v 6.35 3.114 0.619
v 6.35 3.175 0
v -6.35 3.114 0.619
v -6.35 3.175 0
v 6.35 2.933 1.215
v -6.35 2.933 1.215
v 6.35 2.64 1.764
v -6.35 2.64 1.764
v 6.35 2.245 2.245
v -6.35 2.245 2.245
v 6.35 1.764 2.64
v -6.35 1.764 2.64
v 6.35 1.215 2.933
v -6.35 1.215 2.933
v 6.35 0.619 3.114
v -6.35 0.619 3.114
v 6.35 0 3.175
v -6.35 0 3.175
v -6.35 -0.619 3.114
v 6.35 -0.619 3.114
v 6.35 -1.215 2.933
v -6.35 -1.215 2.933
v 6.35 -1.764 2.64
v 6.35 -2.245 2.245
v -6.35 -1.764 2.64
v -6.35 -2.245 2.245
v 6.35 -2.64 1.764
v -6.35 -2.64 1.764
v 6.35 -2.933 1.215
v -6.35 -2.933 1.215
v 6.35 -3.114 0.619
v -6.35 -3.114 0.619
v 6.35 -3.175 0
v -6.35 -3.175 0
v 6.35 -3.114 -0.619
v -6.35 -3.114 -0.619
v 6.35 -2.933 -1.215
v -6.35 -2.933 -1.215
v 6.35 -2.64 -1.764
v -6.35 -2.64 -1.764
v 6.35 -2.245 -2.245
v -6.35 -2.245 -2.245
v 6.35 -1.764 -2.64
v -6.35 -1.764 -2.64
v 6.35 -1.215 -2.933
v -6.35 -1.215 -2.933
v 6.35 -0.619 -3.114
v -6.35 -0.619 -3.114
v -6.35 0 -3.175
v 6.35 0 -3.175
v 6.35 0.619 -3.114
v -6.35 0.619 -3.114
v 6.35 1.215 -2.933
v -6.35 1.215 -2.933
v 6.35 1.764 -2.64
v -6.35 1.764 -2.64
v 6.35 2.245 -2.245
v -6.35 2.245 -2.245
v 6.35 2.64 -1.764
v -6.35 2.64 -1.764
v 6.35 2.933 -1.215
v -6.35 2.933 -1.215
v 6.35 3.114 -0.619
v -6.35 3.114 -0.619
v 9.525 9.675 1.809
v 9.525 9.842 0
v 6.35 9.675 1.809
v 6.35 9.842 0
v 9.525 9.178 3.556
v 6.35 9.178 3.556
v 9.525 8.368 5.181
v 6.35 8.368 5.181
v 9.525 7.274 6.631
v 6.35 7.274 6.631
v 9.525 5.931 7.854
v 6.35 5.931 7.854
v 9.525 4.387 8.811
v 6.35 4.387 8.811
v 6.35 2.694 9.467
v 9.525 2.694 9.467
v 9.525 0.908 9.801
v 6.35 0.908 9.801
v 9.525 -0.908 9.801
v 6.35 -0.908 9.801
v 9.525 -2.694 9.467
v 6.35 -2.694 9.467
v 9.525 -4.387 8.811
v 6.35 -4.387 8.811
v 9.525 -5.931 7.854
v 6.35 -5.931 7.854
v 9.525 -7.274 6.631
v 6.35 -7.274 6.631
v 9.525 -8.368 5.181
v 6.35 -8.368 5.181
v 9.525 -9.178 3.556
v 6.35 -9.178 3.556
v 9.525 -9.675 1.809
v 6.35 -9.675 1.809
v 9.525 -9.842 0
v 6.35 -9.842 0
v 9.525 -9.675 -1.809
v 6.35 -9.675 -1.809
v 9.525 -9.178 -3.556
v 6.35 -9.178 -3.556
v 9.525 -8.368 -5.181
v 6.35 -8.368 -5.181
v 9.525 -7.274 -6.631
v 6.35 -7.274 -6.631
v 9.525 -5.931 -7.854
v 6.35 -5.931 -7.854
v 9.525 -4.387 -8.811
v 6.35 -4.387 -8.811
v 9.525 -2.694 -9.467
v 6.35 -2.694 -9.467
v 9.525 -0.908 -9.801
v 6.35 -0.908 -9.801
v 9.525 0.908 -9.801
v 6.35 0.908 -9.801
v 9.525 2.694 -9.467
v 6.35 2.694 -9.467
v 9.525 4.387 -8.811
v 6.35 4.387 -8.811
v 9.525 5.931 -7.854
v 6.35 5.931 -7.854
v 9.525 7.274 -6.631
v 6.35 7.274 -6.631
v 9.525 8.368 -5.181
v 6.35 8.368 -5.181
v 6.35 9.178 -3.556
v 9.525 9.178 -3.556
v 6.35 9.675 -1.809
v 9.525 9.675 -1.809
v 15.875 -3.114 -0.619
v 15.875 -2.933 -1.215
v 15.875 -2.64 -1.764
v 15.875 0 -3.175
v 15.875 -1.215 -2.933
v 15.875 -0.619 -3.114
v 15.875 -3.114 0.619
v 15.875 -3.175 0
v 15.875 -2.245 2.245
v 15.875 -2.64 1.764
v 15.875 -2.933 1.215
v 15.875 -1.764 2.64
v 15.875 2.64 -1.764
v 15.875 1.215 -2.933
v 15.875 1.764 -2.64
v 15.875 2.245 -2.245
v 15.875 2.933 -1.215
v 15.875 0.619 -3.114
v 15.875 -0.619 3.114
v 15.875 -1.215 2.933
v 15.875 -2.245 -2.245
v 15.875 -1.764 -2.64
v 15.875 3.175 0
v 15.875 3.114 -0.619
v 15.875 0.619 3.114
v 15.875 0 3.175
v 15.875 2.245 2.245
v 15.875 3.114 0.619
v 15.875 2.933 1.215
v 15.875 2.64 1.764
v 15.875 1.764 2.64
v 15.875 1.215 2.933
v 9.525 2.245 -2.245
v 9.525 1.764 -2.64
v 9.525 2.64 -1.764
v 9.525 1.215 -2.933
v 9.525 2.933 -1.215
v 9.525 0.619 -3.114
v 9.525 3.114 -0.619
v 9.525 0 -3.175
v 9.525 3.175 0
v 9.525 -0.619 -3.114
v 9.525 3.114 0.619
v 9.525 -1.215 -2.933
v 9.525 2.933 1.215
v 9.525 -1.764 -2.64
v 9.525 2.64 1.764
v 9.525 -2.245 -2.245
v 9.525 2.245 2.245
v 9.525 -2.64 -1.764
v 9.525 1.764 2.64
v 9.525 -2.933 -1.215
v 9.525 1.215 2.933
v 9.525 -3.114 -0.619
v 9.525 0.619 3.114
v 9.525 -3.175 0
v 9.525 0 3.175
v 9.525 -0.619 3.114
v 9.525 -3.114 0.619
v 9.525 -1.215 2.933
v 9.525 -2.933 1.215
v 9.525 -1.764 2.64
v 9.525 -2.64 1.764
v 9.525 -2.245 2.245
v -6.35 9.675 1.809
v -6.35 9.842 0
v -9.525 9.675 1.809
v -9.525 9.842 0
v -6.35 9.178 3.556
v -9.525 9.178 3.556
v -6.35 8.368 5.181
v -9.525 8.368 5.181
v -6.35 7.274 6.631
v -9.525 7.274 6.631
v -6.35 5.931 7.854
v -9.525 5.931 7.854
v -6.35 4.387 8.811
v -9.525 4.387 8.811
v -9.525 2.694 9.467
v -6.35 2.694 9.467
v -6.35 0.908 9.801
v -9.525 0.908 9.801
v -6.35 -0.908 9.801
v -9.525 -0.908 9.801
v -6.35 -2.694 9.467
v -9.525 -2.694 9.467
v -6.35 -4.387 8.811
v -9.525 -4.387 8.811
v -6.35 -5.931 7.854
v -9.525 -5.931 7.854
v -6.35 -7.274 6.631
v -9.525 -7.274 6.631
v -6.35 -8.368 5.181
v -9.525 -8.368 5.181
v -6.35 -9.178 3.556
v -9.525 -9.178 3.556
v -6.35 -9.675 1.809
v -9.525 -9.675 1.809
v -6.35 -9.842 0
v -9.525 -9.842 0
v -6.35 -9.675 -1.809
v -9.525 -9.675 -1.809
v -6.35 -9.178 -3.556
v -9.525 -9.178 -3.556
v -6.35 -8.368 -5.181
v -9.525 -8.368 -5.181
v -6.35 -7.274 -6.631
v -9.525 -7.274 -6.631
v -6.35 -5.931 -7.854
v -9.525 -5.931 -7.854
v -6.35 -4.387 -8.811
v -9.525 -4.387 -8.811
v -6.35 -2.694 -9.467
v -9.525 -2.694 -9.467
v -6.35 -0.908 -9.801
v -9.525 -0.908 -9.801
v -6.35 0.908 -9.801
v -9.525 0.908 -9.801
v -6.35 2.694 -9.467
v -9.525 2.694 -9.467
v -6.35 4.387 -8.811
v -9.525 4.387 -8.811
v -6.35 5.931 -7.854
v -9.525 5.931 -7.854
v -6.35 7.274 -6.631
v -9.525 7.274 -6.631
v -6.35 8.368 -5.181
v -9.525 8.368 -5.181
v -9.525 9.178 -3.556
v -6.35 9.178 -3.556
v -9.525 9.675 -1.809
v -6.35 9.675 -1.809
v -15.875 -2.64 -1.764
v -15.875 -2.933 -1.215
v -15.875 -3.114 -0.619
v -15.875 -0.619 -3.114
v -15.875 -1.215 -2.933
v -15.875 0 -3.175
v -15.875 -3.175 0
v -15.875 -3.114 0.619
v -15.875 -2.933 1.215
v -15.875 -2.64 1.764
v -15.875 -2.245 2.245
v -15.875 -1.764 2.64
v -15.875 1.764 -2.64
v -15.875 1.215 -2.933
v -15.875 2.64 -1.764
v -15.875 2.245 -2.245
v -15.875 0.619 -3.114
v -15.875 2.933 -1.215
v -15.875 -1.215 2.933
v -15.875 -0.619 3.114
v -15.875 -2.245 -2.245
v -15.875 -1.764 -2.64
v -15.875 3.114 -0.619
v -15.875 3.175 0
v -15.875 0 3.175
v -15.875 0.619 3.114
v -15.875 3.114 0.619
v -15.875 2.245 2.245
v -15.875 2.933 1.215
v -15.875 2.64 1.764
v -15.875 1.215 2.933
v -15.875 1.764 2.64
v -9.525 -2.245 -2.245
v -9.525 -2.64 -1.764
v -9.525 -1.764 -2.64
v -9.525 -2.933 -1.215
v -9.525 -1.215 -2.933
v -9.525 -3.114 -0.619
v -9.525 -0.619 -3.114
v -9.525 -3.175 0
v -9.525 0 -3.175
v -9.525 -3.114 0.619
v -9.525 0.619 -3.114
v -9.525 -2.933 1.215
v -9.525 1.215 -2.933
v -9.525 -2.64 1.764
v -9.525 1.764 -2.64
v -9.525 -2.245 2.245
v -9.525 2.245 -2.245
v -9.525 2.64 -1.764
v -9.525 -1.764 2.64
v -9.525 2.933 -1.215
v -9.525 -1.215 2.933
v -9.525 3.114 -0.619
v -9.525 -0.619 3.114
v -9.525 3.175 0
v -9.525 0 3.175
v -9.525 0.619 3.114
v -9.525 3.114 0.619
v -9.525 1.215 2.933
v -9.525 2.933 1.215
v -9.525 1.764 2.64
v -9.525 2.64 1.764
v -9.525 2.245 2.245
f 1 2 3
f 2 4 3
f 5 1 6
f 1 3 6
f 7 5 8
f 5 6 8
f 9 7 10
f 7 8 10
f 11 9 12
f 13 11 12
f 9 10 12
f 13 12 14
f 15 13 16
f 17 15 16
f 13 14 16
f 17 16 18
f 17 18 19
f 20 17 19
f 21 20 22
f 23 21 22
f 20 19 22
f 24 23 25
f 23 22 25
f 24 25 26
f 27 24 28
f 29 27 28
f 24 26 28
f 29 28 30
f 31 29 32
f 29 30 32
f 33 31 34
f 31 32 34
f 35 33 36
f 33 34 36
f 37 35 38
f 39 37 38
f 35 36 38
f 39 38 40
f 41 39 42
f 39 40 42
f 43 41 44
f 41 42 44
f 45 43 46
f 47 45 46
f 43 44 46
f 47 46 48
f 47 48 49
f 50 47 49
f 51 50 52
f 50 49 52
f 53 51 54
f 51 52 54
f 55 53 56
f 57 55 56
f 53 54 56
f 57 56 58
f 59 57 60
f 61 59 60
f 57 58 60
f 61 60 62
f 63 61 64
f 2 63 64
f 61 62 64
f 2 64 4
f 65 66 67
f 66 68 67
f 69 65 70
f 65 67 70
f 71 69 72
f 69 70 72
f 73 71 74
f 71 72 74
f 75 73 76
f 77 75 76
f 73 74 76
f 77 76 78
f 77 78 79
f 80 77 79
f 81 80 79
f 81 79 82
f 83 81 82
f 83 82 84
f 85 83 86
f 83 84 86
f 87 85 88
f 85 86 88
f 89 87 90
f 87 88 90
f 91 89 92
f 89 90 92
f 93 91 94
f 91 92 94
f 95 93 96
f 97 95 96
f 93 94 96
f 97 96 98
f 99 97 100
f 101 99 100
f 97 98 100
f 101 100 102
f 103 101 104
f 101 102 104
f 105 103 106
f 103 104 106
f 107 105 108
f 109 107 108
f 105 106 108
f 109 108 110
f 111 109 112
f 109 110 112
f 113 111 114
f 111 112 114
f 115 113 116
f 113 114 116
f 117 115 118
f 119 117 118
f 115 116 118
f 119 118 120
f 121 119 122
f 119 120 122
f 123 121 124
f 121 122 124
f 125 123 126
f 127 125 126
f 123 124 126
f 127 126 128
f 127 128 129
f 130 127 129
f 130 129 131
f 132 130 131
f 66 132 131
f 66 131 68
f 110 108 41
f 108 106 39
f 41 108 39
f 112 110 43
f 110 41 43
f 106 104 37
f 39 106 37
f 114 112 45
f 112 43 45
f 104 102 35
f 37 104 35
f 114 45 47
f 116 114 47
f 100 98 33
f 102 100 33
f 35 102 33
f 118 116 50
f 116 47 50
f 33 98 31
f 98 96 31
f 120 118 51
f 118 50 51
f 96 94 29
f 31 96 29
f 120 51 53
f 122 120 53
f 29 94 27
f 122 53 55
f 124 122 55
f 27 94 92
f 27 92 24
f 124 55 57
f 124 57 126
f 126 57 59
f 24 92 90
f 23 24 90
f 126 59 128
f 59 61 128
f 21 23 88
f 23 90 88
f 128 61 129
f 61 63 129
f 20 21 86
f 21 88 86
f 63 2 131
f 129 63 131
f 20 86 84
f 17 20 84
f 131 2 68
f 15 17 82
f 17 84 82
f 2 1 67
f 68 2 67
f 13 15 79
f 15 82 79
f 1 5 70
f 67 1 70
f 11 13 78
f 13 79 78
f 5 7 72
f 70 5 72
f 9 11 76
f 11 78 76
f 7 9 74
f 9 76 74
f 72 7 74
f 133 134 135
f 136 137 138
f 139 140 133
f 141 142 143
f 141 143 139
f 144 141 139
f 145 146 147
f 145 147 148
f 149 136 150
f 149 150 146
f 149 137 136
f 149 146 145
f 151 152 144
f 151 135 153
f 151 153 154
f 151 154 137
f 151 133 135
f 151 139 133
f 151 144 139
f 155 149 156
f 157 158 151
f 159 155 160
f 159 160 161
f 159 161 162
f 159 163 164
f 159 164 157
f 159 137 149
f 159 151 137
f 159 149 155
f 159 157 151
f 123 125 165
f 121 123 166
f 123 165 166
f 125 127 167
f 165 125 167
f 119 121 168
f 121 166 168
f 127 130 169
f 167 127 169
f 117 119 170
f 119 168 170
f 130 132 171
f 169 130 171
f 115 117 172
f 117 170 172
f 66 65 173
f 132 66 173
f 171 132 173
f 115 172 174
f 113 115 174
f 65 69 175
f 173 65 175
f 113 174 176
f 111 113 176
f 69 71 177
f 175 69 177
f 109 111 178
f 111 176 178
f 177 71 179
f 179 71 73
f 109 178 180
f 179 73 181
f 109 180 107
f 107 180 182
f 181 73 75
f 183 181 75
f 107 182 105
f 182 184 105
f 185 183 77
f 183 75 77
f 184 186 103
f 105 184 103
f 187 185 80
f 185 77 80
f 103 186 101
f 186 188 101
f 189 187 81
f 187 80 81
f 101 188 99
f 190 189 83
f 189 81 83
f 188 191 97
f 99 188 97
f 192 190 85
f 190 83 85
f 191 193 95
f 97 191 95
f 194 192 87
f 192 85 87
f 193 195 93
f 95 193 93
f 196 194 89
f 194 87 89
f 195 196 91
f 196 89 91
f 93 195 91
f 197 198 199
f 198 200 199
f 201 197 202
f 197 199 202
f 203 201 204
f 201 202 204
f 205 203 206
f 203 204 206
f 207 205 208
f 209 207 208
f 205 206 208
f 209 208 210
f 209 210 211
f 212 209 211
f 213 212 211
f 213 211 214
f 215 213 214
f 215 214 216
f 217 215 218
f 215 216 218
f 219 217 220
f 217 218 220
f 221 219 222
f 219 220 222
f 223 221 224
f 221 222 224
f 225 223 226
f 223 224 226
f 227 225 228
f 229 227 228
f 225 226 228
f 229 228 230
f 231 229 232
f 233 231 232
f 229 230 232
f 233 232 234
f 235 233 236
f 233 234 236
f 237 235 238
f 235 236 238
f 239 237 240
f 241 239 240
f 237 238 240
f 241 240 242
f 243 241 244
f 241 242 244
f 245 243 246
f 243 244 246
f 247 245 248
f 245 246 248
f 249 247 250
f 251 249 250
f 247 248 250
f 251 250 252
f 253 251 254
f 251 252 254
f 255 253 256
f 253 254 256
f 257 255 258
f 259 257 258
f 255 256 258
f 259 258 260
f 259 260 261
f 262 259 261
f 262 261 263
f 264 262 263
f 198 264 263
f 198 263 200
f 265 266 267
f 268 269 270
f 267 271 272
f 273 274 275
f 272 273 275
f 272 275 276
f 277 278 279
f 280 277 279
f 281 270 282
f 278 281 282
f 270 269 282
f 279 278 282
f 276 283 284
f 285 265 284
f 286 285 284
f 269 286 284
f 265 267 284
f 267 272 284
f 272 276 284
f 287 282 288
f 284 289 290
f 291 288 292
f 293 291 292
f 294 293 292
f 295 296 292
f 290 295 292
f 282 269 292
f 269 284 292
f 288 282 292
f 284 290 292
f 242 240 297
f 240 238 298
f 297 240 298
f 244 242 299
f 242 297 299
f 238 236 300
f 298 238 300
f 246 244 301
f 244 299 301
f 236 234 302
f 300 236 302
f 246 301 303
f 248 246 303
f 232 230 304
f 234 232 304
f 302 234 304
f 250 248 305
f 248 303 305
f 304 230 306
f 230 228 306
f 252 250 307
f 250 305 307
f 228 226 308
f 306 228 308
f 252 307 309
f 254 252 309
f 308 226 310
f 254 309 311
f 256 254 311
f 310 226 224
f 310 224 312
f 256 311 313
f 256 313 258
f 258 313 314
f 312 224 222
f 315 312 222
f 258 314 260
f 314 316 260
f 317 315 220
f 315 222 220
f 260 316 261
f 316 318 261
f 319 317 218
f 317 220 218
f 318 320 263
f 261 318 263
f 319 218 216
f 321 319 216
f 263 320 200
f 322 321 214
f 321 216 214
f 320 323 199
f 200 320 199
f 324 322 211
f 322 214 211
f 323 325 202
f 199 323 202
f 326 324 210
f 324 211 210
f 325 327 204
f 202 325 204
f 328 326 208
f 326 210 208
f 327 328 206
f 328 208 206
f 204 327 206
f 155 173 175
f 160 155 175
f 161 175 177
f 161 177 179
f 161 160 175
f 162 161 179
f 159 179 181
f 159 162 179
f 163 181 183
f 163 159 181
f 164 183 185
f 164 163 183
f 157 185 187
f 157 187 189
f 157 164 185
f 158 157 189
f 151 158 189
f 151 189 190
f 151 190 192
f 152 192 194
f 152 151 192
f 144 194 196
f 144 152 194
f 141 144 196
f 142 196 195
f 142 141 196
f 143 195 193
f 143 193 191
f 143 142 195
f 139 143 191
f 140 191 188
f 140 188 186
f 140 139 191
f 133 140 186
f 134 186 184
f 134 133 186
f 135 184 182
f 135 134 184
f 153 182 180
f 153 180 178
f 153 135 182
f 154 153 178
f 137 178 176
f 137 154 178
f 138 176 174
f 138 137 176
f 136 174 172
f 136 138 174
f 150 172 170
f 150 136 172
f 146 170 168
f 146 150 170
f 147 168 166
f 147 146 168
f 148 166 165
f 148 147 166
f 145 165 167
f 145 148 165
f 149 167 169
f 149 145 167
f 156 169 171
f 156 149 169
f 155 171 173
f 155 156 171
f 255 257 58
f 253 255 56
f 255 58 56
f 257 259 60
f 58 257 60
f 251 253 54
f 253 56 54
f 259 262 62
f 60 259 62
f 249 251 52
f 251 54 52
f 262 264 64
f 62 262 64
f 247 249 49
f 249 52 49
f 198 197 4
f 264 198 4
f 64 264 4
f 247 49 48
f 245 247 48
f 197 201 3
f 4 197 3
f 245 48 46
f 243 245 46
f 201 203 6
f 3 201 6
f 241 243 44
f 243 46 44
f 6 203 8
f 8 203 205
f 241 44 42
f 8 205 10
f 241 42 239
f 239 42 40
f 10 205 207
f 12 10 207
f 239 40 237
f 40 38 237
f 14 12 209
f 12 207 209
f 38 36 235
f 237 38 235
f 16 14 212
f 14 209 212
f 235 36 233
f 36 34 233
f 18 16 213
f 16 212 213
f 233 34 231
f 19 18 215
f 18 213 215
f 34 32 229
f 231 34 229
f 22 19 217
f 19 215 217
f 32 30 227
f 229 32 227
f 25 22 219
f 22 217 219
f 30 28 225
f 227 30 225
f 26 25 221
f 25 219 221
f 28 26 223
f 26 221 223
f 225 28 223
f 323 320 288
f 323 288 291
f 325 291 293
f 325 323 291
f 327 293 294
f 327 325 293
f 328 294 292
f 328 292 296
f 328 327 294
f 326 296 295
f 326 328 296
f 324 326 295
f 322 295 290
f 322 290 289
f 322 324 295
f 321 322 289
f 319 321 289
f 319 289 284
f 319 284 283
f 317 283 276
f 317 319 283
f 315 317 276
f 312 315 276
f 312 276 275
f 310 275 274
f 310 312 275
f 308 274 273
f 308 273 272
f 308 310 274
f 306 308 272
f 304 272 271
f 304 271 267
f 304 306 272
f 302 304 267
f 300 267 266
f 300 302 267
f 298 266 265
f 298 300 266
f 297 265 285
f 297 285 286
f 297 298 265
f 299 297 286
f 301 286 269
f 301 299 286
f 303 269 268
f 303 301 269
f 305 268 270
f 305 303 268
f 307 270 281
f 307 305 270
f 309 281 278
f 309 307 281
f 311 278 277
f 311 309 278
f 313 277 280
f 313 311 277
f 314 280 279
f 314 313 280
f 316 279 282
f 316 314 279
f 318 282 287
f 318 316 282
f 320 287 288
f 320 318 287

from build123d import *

# Parameters (mm, degrees)
F1_R     = 3.175
F2_DEPTH = 15.875


with BuildPart() as f2:
    # F1 (on Right) → F2 (new body, symmetric)
    with BuildSketch(Plane.YZ):
        Circle(F1_R)
    extrude(amount=F2_DEPTH, both=True)

    # F0 (on Top) → F3 (revolve)
    with BuildSketch(Plane.XY):
        Polygon((-12.7, 0), (12.7, 0), (12.7, 1.5875), (9.525, 1.5875), (9.525, 9.8425), (6.35, 9.8425), (6.35, 3.175), (0, 3.175), (-6.35, 3.175), (-6.35, 9.8425), (-9.525, 9.8425), (-9.525, 1.5875), (-12.7, 1.5875), align=None)
    revolve(axis=Axis((0, 0, 0), (1, 0, 0)))


solid = f2.part
